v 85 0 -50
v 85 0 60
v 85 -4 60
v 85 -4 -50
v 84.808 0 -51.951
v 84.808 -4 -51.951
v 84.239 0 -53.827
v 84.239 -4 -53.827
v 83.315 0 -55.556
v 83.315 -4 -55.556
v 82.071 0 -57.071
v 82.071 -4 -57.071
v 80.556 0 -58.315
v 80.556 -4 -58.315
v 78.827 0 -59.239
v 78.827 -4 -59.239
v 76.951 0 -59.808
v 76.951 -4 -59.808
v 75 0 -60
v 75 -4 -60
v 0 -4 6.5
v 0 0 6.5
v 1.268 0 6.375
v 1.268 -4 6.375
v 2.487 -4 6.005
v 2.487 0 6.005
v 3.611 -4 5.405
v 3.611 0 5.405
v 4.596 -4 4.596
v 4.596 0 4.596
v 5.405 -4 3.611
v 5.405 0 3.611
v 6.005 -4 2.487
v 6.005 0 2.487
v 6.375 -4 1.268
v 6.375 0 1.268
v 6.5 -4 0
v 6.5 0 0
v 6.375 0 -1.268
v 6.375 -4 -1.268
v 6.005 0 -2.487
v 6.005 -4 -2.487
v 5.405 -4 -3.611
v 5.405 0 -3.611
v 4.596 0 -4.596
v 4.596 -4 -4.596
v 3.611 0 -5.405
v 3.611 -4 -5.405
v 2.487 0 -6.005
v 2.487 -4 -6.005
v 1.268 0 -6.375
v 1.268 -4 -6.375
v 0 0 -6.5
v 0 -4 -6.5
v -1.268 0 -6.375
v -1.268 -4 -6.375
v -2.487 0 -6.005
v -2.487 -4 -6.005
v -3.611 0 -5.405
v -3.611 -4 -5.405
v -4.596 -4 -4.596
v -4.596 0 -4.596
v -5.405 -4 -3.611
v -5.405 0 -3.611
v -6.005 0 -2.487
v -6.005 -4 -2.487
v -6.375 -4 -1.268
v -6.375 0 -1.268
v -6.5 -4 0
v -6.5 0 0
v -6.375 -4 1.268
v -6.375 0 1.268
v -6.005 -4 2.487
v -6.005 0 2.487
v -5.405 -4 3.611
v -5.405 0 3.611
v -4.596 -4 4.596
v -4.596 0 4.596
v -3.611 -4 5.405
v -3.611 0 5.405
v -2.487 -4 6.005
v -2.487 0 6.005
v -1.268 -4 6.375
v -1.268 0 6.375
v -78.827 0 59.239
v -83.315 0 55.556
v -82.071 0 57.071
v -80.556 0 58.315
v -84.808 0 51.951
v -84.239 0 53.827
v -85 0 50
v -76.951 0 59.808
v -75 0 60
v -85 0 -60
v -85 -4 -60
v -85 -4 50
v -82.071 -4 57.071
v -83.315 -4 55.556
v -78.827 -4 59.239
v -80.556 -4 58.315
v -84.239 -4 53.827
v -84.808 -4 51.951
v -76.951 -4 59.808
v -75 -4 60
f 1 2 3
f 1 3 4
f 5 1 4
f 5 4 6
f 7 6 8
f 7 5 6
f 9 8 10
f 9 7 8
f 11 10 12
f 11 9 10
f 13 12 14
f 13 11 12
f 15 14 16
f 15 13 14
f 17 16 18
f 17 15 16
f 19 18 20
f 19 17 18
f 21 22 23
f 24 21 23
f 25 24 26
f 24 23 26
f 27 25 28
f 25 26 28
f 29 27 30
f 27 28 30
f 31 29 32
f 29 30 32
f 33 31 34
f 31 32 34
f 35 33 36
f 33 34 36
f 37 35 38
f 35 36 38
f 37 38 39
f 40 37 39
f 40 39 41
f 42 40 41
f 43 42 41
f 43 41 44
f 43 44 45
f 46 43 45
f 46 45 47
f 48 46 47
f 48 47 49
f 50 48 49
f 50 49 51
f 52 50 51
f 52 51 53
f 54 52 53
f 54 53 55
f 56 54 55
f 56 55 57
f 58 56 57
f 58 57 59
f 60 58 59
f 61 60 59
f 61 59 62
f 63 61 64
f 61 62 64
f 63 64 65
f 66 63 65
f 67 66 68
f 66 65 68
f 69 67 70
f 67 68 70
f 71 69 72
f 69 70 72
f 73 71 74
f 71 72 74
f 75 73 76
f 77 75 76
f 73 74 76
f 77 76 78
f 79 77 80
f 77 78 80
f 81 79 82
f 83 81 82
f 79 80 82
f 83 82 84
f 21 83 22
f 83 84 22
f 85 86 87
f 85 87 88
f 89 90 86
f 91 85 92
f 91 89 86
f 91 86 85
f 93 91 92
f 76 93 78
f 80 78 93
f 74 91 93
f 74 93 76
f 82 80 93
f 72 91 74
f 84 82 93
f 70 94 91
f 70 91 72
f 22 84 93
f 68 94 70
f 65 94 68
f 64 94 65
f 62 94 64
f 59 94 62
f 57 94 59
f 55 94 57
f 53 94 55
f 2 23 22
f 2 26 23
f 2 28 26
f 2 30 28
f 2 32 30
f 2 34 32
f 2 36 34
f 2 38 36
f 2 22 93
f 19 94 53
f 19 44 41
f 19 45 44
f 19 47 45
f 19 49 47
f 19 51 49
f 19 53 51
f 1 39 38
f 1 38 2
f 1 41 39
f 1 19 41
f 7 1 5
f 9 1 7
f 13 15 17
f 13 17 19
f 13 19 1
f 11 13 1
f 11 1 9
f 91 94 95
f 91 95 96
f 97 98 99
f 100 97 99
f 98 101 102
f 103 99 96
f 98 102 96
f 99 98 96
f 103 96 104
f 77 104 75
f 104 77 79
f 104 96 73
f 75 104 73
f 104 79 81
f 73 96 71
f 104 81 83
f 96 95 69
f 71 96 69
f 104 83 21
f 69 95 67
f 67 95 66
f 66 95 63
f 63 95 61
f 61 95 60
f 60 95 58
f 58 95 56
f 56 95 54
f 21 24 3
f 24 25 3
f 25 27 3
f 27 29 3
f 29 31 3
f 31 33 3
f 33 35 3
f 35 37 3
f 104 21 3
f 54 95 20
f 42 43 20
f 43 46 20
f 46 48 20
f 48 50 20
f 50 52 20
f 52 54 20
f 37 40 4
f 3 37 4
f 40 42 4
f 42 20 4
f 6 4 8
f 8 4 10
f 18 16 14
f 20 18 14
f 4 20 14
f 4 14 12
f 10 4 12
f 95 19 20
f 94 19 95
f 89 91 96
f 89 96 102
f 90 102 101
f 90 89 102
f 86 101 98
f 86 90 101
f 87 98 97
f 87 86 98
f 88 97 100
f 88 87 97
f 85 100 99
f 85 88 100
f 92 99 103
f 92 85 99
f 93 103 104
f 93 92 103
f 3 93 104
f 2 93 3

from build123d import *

# Parameters (mm, degrees)
BOSS_EXTRUDE1_DEPTH = 4
CUT_EXTRUDE1_REACH  = 106.12
SKETCH3_R           = 6.5


with BuildPart() as part:
    # Sketch2 → Boss-Extrude1 (new body)
    with BuildSketch(Plane(origin=(0, 0, 0), x_dir=(1, 0, 0), z_dir=(0, 1, 0))):
        with BuildLine():
            Line((75, 60), (-85, 60))
            Line((-85, 60), (-85, -50))
            ThreePointArc((-85, -50), (-82.071067812, -57.071067812), (-75, -60))
            Line((-75, -60), (85, -60))
            Line((85, -60), (85, 50))
            ThreePointArc((85, 50), (82.071067812, 57.071067812), (75, 60))
        make_face()
    extrude(amount=-BOSS_EXTRUDE1_DEPTH)

    # Sketch3 → Cut-Extrude1 (cut, up to next)
    with BuildSketch(Plane(origin=(0, 0, 0), x_dir=(1, 0, 0), z_dir=(0, 1, 0)), mode=Mode.PRIVATE) as cut_extrude1_sk1:
        with Locations(Location((0, 0, 0), (0, 0, 270))):
            Circle(SKETCH3_R)
    cut_extrude1_tool1 = extrude(cut_extrude1_sk1.sketch, amount=-CUT_EXTRUDE1_REACH, mode=Mode.PRIVATE) & part.part
    add(cut_extrude1_tool1.solids().sort_by_distance((0, 0, 0))[0], mode=Mode.SUBTRACT)


solid = part.part
